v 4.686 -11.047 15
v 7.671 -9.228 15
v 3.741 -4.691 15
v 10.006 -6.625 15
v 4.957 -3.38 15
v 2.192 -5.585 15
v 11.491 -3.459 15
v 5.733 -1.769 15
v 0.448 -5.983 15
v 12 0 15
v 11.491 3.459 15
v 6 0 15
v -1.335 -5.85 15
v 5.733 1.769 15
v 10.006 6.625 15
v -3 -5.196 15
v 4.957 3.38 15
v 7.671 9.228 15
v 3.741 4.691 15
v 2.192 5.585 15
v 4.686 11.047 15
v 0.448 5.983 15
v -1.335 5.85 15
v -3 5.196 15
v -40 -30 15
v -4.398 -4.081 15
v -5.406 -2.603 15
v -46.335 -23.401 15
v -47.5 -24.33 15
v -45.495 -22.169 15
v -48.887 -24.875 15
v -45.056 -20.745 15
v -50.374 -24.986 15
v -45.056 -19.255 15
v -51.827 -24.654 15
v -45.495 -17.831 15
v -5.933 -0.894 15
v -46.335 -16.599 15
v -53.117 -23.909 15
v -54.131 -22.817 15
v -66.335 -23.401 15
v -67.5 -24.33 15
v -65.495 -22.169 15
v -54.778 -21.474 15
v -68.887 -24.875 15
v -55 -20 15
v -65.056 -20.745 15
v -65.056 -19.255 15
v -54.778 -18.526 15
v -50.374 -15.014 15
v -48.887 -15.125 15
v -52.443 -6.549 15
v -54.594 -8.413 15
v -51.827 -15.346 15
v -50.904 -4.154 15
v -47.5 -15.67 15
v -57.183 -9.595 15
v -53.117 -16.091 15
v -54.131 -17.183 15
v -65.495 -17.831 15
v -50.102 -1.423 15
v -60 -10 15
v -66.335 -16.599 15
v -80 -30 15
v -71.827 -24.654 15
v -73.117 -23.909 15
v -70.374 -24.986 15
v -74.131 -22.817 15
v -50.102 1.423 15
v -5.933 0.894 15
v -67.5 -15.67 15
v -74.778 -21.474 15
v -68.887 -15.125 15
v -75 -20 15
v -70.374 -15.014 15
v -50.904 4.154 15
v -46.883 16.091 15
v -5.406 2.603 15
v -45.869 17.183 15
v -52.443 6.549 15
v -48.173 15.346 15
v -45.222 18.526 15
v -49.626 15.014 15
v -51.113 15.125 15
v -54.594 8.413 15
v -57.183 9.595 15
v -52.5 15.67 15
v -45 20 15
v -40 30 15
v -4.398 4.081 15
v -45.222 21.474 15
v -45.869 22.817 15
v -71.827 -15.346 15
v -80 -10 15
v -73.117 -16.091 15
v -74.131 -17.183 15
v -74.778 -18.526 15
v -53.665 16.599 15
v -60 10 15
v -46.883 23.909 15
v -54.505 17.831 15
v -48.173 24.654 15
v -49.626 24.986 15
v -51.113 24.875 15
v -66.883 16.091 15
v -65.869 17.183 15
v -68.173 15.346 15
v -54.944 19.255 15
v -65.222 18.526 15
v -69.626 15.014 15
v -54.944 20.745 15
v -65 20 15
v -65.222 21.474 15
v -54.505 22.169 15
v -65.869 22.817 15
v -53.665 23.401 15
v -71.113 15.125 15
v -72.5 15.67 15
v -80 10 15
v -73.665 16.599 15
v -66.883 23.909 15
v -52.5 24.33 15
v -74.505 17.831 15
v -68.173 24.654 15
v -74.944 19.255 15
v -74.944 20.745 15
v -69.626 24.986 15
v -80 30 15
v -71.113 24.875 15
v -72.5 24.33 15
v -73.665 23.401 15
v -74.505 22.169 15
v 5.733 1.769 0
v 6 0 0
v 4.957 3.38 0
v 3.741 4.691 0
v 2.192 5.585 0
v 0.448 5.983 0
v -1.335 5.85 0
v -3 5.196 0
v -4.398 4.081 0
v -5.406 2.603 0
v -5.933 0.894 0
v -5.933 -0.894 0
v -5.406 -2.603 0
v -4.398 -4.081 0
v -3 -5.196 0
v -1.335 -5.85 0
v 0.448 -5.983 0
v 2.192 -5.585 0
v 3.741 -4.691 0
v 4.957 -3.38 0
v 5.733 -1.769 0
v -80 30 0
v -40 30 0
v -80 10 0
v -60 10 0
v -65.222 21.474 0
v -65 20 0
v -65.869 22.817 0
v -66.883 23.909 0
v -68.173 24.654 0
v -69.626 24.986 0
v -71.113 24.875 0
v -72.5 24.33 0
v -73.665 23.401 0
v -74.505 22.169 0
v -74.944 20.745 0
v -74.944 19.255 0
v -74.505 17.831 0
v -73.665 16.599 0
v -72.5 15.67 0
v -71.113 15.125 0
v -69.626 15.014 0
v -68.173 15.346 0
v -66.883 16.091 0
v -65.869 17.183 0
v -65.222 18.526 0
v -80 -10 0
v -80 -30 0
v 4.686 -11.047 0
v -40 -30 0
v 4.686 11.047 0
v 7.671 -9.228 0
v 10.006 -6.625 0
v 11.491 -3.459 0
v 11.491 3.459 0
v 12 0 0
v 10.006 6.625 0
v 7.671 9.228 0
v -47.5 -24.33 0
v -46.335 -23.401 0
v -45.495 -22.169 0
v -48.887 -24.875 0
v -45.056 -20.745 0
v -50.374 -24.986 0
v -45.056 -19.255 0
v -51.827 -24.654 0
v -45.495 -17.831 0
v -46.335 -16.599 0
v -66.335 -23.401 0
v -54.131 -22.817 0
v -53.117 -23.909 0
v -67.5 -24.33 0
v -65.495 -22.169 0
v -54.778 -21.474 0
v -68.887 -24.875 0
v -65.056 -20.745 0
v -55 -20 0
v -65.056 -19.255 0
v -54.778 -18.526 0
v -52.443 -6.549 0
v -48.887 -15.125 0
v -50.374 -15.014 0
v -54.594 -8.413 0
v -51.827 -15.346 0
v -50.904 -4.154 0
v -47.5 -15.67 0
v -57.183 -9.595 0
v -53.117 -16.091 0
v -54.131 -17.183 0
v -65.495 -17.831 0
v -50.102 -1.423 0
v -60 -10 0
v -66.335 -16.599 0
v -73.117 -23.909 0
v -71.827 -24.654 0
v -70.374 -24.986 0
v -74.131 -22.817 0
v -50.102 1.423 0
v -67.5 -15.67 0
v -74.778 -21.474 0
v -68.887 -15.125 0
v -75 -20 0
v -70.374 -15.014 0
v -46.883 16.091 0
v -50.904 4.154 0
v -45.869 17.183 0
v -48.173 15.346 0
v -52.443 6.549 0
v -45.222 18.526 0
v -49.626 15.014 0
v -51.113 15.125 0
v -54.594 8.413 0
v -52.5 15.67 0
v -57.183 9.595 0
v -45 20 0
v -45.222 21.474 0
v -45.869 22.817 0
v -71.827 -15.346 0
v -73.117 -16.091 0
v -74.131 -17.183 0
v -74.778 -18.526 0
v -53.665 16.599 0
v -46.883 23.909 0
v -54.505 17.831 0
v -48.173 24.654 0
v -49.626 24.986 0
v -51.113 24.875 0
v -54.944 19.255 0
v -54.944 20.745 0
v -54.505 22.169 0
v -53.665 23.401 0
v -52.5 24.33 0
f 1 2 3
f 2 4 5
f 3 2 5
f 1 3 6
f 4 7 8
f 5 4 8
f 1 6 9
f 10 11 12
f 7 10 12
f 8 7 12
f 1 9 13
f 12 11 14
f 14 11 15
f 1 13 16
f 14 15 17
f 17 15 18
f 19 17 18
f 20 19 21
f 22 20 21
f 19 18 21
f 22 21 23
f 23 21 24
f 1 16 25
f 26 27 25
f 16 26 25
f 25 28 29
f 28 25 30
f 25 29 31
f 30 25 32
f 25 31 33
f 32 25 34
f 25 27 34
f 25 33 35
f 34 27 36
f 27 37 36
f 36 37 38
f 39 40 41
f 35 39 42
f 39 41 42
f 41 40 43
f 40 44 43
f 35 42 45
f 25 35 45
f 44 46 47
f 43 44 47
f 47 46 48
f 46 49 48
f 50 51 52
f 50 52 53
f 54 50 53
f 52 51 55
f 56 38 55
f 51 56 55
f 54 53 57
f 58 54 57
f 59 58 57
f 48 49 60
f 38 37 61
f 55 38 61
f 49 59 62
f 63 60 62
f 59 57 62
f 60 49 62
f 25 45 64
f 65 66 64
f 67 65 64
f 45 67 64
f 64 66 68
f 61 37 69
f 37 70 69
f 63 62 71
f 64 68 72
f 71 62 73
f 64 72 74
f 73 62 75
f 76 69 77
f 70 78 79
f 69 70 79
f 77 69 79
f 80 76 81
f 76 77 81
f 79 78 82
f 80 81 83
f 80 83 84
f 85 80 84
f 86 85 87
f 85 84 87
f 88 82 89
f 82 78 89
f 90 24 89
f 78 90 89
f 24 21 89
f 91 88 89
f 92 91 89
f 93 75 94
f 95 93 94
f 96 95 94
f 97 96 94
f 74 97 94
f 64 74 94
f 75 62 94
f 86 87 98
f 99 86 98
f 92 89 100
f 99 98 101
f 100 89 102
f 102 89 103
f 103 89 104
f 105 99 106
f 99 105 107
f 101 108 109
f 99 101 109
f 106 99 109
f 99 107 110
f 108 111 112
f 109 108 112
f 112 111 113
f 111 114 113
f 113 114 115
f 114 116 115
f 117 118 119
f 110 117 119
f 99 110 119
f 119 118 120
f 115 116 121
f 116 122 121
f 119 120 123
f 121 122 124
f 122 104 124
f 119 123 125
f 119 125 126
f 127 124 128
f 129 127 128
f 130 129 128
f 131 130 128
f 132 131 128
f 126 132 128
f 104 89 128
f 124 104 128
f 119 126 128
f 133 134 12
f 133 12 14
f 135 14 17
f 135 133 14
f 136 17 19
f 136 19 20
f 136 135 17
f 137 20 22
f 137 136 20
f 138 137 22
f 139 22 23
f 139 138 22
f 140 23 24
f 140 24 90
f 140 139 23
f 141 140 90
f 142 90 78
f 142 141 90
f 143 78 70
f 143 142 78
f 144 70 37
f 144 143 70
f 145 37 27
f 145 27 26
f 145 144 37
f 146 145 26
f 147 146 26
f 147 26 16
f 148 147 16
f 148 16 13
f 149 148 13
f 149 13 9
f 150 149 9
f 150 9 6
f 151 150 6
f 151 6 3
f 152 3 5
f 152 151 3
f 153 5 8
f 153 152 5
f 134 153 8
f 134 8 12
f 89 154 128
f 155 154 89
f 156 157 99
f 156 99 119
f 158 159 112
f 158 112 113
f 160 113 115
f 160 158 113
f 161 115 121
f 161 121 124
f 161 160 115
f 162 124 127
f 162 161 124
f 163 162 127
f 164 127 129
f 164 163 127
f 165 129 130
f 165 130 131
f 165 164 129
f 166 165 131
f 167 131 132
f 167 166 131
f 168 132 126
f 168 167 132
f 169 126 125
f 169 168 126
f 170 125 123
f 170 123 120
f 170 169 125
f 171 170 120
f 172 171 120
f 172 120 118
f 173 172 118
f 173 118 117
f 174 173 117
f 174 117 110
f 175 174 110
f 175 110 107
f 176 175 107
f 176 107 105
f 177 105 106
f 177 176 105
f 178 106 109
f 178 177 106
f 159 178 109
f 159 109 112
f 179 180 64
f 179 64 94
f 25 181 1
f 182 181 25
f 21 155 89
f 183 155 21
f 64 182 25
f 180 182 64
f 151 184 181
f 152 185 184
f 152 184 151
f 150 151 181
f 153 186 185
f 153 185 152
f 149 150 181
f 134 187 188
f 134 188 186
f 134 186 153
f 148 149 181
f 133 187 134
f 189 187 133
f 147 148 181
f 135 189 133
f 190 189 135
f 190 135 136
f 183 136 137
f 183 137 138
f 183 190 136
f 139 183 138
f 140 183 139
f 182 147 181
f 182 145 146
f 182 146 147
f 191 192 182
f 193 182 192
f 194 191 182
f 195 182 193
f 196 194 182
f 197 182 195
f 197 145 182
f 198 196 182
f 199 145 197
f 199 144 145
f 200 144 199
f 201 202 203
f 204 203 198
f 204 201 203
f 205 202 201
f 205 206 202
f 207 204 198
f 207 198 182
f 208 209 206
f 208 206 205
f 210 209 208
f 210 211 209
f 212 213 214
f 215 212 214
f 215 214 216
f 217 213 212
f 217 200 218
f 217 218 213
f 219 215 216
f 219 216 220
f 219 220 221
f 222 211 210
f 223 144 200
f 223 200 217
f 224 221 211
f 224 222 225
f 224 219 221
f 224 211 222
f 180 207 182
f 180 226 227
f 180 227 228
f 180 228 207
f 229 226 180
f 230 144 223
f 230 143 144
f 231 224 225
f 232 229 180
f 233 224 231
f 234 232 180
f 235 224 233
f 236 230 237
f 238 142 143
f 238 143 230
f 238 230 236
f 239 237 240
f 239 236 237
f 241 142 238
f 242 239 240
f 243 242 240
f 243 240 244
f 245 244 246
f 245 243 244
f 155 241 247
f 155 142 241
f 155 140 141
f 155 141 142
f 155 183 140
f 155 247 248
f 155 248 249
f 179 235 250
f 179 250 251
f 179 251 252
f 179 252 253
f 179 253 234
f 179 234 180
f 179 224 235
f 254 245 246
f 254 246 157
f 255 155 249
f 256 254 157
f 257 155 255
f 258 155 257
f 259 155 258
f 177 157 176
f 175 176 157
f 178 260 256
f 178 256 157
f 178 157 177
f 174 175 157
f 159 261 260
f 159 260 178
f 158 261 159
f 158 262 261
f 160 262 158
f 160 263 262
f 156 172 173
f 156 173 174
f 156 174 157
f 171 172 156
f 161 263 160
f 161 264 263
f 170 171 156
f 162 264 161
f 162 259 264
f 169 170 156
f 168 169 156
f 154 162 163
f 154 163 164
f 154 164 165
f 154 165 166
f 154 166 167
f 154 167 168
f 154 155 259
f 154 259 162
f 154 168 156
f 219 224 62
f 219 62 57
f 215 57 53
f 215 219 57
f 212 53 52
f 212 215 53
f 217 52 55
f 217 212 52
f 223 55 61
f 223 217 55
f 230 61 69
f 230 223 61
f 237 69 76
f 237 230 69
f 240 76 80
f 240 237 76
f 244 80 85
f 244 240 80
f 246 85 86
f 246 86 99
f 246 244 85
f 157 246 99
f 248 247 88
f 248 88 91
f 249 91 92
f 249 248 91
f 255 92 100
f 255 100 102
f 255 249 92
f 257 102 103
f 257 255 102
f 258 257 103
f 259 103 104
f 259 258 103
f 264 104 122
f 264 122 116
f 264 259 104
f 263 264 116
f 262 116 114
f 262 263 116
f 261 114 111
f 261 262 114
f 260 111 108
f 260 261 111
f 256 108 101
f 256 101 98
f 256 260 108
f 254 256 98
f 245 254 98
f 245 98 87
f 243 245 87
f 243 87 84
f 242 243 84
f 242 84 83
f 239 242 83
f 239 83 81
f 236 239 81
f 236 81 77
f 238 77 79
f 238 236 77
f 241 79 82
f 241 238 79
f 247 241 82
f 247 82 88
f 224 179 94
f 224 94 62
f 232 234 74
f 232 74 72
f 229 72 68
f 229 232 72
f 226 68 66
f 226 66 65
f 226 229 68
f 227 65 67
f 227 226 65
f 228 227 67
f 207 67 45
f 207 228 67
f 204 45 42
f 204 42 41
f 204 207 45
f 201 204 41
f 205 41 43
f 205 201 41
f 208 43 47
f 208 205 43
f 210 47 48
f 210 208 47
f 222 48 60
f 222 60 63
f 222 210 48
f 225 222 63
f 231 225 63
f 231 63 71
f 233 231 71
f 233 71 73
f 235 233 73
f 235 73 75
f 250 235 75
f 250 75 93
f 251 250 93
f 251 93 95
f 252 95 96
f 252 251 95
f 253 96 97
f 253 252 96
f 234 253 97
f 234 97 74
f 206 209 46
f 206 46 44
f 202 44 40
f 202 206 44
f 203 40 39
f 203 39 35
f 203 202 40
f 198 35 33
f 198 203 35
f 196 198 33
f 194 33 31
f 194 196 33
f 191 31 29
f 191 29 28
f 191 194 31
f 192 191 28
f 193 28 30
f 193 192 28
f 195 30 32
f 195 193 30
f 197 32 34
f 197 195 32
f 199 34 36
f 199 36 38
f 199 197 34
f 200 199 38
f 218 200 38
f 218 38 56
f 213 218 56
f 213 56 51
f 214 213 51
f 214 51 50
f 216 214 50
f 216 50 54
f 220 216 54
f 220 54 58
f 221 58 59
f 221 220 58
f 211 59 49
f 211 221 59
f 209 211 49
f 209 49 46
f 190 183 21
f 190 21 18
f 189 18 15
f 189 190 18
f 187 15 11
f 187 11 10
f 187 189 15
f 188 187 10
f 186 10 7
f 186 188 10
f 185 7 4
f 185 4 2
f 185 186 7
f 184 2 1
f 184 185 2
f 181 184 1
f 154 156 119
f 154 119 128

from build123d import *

# Parameters (mm, degrees)
SKETCH1_R           = 6
SKETCH1_R_2         = 5
BOSS_EXTRUDE1_DEPTH = 15


with BuildPart() as part:
    # Sketch1 → Boss-Extrude1 (new body)
    with BuildSketch(Plane.XY):
        with BuildLine():
            Line((-80, 30), (-40, 30))
            Line((-40, 30), (4.685564793, 11.047419724))
            ThreePointArc((4.685564793, 11.047419724), (12, 0), (4.685564793, -11.047419724))
            Line((4.685564793, -11.047419724), (-40, -30))
            Line((-40, -30), (-80, -30))
            Line((-80, -30), (-80, -10))
            Line((-80, -10), (-60, -10))
            ThreePointArc((-60, -10), (-50, 0), (-60, 10))
            Line((-60, 10), (-80, 10))
            Line((-80, 10), (-80, 30))
        make_face()
        Circle(SKETCH1_R, mode=Mode.SUBTRACT)
        with Locations((-70, 20)):
            Circle(SKETCH1_R_2, mode=Mode.SUBTRACT)
        with Locations((-50, 20)):
            Circle(SKETCH1_R_2, mode=Mode.SUBTRACT)
        with Locations(Location((-70, -20, 0), (0, 0, 180))):
            Circle(SKETCH1_R_2, mode=Mode.SUBTRACT)
        with Locations(Location((-50, -20, 0), (0, 0, 180))):
            Circle(SKETCH1_R_2, mode=Mode.SUBTRACT)
    extrude(amount=BOSS_EXTRUDE1_DEPTH)


solid = part.part
